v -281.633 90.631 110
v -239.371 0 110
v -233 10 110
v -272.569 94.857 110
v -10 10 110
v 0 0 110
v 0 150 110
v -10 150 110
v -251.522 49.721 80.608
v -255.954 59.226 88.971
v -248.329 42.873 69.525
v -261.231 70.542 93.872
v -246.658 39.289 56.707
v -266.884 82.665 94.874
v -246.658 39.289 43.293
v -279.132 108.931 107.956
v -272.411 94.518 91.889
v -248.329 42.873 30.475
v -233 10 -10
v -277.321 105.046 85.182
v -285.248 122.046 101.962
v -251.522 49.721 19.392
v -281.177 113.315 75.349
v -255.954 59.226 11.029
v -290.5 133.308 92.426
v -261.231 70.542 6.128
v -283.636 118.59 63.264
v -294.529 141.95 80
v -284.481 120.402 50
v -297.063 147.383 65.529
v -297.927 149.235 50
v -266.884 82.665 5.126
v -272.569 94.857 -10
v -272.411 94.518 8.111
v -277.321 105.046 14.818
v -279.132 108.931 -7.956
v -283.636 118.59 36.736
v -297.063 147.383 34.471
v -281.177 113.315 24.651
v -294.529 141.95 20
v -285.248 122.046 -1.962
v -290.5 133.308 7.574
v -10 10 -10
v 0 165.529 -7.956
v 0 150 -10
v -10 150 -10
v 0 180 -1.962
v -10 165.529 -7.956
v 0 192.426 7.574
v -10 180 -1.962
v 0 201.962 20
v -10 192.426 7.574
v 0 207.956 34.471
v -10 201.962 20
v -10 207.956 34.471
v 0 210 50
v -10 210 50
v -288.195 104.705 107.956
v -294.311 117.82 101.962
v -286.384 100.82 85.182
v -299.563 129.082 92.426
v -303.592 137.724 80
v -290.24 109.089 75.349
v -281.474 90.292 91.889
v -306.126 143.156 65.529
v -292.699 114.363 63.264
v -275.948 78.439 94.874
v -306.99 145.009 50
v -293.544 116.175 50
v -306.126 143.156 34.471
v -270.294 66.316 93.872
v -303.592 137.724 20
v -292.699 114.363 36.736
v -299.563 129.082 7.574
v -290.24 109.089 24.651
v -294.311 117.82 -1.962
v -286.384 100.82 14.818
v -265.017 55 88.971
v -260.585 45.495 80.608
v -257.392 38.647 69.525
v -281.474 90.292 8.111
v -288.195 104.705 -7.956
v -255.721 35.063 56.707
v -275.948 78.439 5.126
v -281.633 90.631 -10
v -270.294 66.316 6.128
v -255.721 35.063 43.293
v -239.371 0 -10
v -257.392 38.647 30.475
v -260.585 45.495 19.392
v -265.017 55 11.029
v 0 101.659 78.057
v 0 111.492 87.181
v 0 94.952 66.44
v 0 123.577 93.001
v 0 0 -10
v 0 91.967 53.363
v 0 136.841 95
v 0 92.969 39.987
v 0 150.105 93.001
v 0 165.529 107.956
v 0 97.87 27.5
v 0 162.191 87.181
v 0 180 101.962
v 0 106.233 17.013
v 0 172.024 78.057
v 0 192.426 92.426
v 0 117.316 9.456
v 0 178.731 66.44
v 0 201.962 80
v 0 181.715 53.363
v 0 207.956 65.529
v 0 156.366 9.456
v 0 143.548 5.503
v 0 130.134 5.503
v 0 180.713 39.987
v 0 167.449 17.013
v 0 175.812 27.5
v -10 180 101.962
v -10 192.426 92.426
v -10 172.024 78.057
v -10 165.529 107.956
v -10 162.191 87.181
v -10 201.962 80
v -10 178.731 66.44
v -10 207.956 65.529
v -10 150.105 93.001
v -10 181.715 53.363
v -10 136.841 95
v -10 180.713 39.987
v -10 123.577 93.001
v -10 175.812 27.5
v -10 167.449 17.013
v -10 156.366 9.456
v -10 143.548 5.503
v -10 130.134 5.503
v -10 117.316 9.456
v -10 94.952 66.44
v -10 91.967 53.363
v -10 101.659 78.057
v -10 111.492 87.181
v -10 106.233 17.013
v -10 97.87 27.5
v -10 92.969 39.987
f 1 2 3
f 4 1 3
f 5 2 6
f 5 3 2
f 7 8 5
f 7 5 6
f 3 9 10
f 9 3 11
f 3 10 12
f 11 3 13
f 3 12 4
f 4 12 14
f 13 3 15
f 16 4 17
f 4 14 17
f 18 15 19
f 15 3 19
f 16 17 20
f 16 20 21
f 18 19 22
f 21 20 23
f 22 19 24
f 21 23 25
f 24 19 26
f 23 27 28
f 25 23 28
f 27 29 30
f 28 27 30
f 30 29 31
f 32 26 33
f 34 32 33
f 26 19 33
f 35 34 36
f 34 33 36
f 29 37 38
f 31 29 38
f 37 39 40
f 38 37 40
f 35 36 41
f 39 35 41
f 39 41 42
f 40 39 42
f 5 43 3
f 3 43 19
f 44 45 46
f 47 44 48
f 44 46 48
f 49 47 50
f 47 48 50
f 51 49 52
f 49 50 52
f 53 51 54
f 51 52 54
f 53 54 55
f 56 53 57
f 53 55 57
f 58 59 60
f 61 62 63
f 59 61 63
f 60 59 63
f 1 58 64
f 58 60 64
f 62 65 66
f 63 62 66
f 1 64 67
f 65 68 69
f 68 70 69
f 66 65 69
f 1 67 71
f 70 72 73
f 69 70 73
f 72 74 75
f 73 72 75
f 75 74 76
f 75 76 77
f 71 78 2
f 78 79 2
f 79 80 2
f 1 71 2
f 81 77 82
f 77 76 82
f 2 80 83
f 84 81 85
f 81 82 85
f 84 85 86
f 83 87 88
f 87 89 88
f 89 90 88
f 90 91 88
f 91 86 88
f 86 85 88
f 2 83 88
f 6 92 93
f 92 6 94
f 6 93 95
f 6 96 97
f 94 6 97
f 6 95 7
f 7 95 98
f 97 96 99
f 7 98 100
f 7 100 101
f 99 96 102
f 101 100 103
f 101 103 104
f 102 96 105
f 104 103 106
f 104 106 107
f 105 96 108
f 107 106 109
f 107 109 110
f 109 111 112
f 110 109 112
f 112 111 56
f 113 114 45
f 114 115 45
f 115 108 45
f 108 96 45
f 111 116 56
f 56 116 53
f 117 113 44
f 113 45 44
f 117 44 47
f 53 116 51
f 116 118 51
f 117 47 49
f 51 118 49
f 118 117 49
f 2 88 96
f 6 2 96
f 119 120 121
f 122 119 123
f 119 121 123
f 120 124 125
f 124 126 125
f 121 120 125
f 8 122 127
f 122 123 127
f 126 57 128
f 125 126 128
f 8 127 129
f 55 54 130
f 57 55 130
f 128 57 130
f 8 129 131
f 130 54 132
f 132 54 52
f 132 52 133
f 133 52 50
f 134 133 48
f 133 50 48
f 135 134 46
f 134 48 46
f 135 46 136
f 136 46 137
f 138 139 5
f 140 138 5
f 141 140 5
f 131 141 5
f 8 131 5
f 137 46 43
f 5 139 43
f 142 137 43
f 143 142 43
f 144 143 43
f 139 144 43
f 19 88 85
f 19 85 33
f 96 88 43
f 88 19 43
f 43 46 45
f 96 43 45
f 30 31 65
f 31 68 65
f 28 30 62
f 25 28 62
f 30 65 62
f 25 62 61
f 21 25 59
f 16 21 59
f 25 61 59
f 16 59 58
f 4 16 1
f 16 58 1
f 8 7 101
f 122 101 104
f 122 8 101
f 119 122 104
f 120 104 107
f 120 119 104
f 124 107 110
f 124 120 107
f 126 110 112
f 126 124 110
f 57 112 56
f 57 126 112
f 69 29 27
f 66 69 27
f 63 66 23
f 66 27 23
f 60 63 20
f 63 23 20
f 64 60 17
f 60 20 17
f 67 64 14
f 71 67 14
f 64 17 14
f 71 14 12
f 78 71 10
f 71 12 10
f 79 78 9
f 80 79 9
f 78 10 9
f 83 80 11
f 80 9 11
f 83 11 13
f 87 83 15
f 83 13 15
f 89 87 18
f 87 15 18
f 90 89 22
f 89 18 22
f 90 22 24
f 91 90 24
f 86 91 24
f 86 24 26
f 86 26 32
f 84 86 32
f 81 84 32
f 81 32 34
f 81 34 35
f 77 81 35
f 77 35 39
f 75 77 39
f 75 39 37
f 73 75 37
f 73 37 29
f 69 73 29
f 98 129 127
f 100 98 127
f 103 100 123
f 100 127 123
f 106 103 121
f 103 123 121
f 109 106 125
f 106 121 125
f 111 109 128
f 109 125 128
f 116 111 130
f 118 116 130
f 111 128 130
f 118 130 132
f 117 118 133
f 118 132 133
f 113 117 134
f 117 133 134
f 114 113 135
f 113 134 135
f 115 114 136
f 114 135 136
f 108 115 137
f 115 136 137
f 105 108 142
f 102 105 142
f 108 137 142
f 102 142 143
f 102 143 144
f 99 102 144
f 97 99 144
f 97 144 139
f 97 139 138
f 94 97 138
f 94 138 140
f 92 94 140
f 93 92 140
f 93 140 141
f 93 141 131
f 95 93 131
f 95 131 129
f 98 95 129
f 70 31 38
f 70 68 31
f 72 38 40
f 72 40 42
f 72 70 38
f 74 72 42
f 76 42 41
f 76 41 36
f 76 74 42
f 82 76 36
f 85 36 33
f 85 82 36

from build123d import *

# Parameters (mm, degrees)
SALIENTE_EXTRUIR1_DEPTH      = 110
SALIENTE_EXTRUIR1_DEPTH_BACK = 10
CROQUIS2_R                   = 45
CORTAR_EXTRUIR1_DEPTH        = 100
CROQUIS3_R                   = 45
CORTAR_EXTRUIR2_DEPTH        = 100
FILLET1_R                    = 60


with BuildPart() as part:
    # Croquis1 → Saliente-Extruir1 (new, two sides: drawn at the far end of the back side and taken through both)
    with BuildSketch(Plane.XY.offset(-SALIENTE_EXTRUIR1_DEPTH_BACK)):
        Polygon((-306.989624487, 145.009245926), (-239.370702608, 0), (0, 0), (0, 210), (-10, 210), (-10, 10), (-233, 10), (-297.926546616, 149.235428543), align=None)
    extrude(amount=SALIENTE_EXTRUIR1_DEPTH + SALIENTE_EXTRUIR1_DEPTH_BACK)

    # Croquis2 → Cortar-Extruir1 (cut)
    with BuildSketch(Plane.ZY.offset(10)):
        with Locations((50, 136.841249694)):
            Circle(CROQUIS2_R)
    extrude(amount=-CORTAR_EXTRUIR1_DEPTH, mode=Mode.SUBTRACT)

    # Croquis3 → Cortar-Extruir2 (cut)
    with BuildSketch(Plane(origin=(-187.554534313, -87.458115672, 0), x_dir=(0, 0, -1), z_dir=(0.906307787036651, 0.4226182617406971, 0))):
        with Locations(Location((-50, 184.347781552, 0), (0, 0, 90))):
            Circle(CROQUIS3_R)
    extrude(amount=-CORTAR_EXTRUIR2_DEPTH, mode=Mode.SUBTRACT)

    # Fillet1
    fillet1_edges = [part.edges().sort_by_distance(p)[0] for p in [
        (-5, 210, 110),
        (-5, 210, -10),
        (-302.458085551, 147.122337235, -10),
        (-302.458085551, 147.122337235, 110),
    ]]
    fillet(fillet1_edges, radius=FILLET1_R - 0.0001)  # a hair under: the kernel refuses the full size


solid = part.part
